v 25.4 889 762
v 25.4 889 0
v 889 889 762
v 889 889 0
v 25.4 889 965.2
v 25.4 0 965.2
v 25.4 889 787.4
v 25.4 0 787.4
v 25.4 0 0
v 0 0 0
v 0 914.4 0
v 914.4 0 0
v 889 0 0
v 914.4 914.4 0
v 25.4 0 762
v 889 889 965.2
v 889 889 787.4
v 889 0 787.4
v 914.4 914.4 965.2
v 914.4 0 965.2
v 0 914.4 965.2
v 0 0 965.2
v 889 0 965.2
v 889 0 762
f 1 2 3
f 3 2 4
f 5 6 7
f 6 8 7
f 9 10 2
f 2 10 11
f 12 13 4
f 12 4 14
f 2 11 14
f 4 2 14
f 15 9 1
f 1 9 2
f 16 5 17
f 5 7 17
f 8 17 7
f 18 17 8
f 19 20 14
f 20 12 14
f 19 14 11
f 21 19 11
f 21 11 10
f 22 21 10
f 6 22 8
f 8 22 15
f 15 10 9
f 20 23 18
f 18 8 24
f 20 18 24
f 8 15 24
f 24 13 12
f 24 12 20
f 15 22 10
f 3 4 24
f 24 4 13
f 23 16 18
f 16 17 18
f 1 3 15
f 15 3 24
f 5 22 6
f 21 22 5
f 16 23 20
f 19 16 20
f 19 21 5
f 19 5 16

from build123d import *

# Parameters (mm, degrees)
F1_DEPTH = 914.4
F2_W     = 889
F2_H     = 25.4
F3_DEPTH = 889
F4_DEPTH = 50.8


with BuildPart() as f1:
    # F0 (on Top) → F1 (new body)
    with BuildSketch(Plane.XY):
        Polygon((889, 914.4), (0, 914.4), (0, 25.4), (0, 0), (25.4, 0), (25.4, 25.4), (25.4, 889), (889, 889), (889, 25.4), (889, 0), (914.4, 0), (914.4, 889), (914.4, 914.4), align=None)
    extrude(amount=F1_DEPTH)

    # F2 (on face) → F3 (join)
    with BuildSketch(Plane(origin=(889, 0, 0), x_dir=(0, -1, 0), z_dir=(-1, 0, 0))):
        with Locations((-444.5, 774.7)):
            Rectangle(F2_W, F2_H)
    extrude(amount=F3_DEPTH)

    # F4 (add): a face of the model
    f4_faces = [f1.faces().sort_by_distance(p)[0] for p in [
        (457.2, 901.4684311857, 914.4),
    ]]
    extrude(f4_faces, amount=F4_DEPTH)


solid = f1.part
